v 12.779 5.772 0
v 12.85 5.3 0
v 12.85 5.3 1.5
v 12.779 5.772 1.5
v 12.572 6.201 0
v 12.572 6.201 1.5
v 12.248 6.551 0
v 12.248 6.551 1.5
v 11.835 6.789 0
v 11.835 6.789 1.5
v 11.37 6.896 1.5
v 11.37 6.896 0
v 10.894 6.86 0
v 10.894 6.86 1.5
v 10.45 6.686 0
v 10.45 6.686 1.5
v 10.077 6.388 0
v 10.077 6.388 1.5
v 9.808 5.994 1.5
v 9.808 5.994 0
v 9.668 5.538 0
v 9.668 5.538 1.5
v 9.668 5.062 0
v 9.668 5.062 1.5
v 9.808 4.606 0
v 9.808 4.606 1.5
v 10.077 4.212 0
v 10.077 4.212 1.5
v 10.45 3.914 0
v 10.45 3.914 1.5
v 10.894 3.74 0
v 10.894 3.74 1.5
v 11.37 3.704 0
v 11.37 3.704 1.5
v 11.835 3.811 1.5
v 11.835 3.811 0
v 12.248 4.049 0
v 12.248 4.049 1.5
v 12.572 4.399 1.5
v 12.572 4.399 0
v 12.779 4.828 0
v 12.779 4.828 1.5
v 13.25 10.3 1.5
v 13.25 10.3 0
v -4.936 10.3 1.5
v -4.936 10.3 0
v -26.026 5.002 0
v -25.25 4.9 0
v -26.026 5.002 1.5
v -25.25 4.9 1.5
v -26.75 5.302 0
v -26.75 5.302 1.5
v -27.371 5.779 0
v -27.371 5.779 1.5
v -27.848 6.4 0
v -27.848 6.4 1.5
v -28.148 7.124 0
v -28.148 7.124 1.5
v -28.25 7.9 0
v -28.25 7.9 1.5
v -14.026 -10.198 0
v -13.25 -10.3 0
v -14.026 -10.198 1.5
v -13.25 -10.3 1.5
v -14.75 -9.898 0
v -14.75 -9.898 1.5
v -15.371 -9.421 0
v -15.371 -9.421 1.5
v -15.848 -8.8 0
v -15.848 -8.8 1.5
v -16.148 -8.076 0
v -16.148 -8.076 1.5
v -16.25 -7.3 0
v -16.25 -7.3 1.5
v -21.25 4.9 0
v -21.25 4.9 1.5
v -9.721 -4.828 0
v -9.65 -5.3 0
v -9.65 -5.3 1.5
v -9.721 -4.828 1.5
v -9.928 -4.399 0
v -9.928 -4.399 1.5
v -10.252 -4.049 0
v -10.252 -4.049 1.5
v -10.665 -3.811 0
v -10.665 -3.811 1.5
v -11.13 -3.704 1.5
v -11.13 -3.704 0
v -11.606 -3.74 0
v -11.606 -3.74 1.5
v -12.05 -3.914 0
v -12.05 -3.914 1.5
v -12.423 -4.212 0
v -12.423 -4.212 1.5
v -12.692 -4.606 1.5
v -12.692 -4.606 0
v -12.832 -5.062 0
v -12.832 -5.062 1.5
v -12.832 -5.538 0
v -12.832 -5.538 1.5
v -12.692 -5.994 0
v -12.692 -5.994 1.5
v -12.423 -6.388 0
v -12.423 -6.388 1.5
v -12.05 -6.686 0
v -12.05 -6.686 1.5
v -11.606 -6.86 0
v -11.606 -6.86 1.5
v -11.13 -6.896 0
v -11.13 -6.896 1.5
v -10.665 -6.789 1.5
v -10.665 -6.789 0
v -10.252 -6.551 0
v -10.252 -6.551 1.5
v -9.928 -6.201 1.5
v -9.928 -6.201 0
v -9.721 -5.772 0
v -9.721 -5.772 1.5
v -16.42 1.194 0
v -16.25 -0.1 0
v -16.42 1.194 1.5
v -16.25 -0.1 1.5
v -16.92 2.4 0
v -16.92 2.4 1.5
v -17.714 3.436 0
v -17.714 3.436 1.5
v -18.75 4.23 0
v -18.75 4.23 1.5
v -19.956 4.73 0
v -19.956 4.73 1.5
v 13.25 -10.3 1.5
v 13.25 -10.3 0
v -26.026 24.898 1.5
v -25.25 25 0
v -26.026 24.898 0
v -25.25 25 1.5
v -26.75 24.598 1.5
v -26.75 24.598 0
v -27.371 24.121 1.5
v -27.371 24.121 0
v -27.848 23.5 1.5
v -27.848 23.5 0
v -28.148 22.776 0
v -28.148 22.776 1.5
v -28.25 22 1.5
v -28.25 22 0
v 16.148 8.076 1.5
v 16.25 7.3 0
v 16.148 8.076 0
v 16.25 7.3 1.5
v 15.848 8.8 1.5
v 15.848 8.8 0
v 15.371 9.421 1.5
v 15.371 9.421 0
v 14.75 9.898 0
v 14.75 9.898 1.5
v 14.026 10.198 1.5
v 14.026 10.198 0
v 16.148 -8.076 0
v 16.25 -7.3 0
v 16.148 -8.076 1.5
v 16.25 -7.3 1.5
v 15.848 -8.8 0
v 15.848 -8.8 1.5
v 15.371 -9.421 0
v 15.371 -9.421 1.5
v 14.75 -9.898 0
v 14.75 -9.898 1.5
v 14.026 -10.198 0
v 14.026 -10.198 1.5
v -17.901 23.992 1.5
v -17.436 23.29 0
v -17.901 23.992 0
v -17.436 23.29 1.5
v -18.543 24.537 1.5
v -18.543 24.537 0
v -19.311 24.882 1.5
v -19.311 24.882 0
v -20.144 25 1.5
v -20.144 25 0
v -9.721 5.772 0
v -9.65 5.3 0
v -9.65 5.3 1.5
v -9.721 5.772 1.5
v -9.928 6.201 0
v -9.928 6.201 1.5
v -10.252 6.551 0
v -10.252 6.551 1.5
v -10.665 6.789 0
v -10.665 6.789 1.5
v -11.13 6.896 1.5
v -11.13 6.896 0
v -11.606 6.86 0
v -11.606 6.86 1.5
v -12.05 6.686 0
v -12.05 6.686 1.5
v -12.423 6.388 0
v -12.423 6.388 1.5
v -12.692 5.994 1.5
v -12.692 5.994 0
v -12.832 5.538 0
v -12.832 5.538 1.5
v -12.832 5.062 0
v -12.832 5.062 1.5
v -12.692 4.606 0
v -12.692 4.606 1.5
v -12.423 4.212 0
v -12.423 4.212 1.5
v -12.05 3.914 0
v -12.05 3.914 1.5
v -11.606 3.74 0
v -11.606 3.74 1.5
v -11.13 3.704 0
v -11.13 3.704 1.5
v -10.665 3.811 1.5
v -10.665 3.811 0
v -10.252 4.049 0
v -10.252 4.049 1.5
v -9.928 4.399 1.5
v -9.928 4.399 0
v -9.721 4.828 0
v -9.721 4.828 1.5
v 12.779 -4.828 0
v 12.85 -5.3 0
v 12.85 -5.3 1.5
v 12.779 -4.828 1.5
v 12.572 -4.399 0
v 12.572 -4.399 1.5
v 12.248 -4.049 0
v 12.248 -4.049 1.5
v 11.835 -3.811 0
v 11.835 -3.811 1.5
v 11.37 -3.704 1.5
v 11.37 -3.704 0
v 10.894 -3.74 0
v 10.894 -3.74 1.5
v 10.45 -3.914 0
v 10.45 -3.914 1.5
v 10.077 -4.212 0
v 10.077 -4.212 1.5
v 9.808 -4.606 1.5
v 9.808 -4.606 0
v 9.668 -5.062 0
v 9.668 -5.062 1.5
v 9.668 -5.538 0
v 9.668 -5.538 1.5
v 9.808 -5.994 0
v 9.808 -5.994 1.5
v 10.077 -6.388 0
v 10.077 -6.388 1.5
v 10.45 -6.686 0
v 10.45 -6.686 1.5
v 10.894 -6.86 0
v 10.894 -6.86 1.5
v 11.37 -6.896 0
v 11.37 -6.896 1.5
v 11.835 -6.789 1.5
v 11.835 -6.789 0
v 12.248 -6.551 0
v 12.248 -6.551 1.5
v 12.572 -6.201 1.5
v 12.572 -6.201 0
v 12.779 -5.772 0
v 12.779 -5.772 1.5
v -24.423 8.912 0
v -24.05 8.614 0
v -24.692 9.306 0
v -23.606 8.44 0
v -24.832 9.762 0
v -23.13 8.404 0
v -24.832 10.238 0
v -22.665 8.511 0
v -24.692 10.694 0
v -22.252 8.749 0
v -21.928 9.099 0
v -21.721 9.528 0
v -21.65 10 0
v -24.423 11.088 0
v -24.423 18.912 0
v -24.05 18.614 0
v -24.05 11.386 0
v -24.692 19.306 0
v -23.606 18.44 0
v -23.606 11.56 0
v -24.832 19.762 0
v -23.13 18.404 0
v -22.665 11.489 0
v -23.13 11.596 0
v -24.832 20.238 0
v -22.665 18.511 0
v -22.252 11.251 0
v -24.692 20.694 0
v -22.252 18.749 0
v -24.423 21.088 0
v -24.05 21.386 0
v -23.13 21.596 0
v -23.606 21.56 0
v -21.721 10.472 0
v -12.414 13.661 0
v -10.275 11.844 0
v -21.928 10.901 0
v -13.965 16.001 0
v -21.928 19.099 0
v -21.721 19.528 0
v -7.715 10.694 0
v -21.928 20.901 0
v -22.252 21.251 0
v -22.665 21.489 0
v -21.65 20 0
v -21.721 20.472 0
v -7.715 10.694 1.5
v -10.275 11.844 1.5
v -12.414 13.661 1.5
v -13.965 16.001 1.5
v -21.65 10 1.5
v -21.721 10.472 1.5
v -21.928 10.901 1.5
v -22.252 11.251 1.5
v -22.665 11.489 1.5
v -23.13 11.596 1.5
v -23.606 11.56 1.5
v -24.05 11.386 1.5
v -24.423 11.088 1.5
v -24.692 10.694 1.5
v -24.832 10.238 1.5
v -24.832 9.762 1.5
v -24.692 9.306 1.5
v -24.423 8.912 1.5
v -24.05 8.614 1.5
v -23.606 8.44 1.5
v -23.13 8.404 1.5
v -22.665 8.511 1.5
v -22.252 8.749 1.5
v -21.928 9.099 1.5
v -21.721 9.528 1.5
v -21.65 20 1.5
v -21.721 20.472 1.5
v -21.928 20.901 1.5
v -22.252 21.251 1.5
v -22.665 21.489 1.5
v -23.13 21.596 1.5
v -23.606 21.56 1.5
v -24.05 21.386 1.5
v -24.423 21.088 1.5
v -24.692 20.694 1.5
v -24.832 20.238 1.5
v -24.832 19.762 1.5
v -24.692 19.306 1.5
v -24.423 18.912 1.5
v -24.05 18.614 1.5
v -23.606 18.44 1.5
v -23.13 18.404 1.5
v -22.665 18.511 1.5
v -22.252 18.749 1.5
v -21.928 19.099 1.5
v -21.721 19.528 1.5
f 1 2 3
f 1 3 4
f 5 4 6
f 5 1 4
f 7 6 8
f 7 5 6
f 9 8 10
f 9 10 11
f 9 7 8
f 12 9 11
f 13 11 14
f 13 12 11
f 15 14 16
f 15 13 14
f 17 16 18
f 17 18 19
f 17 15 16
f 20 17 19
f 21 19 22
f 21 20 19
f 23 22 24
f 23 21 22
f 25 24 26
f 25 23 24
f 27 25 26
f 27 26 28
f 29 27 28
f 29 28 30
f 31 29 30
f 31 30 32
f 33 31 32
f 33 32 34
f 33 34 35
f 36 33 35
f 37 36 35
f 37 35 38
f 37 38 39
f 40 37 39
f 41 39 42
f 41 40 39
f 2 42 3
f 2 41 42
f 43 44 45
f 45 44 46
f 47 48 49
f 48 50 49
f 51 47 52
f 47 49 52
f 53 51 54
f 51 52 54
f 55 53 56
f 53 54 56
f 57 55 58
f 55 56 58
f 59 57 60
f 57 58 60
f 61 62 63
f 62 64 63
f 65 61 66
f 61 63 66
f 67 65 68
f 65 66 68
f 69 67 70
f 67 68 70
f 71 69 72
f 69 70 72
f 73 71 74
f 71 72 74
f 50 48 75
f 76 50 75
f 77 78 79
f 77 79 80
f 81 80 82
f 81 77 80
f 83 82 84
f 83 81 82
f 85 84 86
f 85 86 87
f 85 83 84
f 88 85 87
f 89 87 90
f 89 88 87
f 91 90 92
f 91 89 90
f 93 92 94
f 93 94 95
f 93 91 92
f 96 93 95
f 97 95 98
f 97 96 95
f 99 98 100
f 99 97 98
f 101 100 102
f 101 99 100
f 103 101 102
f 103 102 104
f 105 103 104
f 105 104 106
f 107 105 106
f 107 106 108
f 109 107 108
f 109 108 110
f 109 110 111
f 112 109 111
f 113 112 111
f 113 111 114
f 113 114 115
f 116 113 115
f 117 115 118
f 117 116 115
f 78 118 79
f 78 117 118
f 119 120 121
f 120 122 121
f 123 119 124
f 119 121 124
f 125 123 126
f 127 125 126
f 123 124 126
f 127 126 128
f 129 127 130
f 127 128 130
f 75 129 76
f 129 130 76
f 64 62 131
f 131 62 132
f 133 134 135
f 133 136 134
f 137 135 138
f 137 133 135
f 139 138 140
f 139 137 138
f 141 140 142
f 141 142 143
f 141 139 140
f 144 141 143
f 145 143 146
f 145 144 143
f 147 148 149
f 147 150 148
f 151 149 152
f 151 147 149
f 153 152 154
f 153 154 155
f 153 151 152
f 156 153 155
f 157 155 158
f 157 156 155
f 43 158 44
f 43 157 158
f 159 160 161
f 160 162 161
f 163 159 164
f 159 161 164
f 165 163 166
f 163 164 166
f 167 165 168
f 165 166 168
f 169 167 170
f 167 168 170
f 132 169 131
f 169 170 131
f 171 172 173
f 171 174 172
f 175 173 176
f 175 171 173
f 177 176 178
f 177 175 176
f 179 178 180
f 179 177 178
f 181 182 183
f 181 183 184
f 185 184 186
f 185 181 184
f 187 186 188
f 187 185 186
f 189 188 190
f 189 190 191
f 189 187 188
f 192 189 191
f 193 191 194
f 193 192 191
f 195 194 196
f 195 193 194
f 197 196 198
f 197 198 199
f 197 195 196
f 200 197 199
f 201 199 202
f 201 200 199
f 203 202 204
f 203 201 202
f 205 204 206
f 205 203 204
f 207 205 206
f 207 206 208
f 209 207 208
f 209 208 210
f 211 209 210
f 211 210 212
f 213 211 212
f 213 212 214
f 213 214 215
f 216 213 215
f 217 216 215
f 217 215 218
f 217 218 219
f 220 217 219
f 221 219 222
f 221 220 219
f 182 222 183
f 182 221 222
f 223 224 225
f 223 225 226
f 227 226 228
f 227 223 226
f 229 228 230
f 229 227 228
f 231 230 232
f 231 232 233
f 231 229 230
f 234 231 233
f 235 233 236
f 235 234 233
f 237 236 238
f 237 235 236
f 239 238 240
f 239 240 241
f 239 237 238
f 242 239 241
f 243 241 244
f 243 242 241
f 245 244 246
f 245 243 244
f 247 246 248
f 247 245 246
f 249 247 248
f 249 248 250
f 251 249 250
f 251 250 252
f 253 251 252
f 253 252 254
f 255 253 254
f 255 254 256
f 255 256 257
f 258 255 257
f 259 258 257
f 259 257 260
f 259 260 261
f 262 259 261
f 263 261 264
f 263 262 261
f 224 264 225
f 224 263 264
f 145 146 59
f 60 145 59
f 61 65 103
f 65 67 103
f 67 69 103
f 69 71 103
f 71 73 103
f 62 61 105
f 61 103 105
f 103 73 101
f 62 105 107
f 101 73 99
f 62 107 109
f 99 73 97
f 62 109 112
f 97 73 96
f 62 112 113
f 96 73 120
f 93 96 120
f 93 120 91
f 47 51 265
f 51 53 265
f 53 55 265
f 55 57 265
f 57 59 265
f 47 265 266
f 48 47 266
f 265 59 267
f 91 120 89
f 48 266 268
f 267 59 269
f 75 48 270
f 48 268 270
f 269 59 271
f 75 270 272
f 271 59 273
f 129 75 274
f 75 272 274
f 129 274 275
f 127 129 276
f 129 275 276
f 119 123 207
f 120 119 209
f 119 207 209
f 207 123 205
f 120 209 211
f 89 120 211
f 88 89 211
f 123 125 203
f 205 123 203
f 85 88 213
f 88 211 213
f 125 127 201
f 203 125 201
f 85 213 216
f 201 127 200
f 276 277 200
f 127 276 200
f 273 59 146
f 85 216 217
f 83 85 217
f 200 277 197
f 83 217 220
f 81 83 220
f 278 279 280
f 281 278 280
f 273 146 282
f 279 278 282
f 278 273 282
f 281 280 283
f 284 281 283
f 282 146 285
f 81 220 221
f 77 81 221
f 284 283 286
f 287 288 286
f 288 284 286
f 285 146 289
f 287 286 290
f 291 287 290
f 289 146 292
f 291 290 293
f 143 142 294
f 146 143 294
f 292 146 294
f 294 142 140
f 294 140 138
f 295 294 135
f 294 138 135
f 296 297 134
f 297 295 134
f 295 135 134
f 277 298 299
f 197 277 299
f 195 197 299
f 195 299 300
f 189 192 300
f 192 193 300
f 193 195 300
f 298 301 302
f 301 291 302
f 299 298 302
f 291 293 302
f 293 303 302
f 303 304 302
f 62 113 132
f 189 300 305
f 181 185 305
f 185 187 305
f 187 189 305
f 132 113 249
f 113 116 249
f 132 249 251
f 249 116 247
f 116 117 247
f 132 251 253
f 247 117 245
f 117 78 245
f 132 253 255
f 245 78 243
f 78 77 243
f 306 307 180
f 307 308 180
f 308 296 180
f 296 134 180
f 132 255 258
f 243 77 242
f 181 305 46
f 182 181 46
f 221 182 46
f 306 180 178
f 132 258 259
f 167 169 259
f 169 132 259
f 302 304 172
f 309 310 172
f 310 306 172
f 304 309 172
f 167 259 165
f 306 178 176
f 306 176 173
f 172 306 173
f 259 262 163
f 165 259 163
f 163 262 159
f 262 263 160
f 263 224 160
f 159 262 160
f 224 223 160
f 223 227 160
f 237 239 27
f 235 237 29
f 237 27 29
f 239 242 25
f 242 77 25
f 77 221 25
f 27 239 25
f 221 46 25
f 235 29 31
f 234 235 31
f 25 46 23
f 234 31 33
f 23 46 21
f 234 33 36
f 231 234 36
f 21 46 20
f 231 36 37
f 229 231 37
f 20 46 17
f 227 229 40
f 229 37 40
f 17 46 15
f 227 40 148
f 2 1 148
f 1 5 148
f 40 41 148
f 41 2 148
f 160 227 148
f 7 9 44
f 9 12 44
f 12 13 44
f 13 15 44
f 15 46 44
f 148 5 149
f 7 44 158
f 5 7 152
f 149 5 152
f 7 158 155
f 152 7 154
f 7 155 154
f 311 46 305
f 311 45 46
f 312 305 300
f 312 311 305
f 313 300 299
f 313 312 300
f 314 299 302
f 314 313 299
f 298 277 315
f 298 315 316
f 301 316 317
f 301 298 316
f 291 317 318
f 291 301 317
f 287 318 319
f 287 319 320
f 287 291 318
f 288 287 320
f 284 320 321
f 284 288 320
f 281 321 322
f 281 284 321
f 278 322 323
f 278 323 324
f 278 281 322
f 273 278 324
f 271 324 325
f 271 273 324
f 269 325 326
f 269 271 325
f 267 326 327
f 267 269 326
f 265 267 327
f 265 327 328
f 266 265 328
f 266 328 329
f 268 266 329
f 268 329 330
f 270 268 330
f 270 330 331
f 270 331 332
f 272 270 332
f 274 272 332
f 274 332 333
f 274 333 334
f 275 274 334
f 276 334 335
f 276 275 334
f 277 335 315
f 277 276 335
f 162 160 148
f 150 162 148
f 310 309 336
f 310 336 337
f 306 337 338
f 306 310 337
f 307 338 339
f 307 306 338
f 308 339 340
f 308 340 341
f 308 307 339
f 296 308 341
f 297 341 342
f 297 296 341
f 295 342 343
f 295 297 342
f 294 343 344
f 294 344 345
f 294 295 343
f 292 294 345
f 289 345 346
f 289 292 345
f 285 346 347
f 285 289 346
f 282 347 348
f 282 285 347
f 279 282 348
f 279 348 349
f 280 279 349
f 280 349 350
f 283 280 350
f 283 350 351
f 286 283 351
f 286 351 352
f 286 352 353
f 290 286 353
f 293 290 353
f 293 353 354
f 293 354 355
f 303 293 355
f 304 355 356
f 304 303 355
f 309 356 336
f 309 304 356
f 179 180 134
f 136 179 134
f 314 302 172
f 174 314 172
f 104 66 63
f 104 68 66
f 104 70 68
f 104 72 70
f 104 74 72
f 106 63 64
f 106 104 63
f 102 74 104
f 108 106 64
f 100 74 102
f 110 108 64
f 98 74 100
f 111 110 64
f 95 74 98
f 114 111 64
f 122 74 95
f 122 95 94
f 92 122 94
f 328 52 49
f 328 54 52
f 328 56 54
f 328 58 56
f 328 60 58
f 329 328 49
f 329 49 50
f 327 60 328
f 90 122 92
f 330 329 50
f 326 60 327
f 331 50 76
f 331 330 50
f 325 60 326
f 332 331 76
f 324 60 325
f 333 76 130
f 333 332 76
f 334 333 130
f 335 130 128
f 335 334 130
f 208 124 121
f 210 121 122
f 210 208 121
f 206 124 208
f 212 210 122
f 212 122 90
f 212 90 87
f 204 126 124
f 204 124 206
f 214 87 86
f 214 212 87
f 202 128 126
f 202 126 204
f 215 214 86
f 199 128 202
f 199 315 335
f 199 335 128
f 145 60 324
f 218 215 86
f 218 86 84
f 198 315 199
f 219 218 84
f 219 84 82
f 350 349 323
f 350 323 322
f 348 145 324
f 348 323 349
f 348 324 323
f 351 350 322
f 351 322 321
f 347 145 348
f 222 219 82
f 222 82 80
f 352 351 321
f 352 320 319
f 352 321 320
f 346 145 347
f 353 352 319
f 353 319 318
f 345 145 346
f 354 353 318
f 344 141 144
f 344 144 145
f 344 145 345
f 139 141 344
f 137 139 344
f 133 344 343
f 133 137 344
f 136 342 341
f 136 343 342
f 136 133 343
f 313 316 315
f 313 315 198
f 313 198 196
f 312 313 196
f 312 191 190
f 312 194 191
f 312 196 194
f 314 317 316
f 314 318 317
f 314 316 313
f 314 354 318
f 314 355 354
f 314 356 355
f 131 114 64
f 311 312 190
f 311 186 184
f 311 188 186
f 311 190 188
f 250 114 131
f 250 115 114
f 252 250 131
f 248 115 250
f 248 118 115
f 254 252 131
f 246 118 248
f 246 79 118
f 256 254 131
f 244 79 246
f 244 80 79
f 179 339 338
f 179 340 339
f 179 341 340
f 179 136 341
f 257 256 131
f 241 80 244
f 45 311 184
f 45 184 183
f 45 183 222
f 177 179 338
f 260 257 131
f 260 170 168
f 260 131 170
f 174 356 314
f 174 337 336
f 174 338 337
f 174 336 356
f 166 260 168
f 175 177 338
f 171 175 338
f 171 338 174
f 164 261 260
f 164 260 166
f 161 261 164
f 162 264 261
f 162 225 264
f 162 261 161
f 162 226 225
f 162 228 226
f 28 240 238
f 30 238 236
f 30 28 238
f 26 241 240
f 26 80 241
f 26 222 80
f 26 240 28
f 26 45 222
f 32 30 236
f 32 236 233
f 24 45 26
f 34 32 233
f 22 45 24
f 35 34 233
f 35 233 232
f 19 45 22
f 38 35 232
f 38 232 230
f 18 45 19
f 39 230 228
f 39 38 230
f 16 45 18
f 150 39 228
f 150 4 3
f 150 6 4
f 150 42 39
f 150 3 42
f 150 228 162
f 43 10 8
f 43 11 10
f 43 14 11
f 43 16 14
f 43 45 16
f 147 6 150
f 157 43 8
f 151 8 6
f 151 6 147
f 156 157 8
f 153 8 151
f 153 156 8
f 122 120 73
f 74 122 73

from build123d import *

# Parameters (mm, degrees)
SKETCH_1_R      = 1.6
EXTRUDE_1_DEPTH = 1.5
FILLET_5_R      = 3
FILLET_6_R      = 5
FILLET_8_R      = 10


with BuildPart() as part:
    # ｽｹｯﾁ1 → ﾎﾞｽ - 押し出し1 (new body)
    with BuildSketch(Plane.XY):
        Polygon((16.25, -10.3), (16.25, 10.3), (-11.25, 10.3), (-18.25, 25), (-28.25, 25), (-28.25, 4.9), (-16.25, 4.9), (-16.25, -10.3), align=None)
        with Locations((-11.25, -5.3)):
            Circle(SKETCH_1_R, mode=Mode.SUBTRACT)
        with Locations((11.25, -5.3)):
            Circle(SKETCH_1_R, mode=Mode.SUBTRACT)
        with Locations((-11.25, 5.3)):
            Circle(SKETCH_1_R, mode=Mode.SUBTRACT)
        with Locations((11.25, 5.3)):
            Circle(SKETCH_1_R, mode=Mode.SUBTRACT)
        with Locations((-23.25, 20)):
            Circle(SKETCH_1_R, mode=Mode.SUBTRACT)
        with Locations((-23.25, 10)):
            Circle(SKETCH_1_R, mode=Mode.SUBTRACT)
    extrude(amount=EXTRUDE_1_DEPTH)

    # ﾌｨﾚｯﾄ5
    fillet_5_edges = [part.edges().sort_by_distance(p)[0] for p in [
        (-28.25, 4.9, 0.75),
        (-28.25, 25, 0.75),
        (-18.25, 25, 0.75),
        (16.25, 10.3, 0.75),
        (16.25, -10.3, 0.75),
        (-16.25, -10.3, 0.75),
    ]]
    fillet(fillet_5_edges, radius=FILLET_5_R)

    # ﾌｨﾚｯﾄ6
    fillet_6_edges = [part.edges().sort_by_distance(p)[0] for p in [
        (-16.25, 4.9, 0.75),
    ]]
    fillet(fillet_6_edges, radius=FILLET_6_R)

    # ﾌｨﾚｯﾄ8
    fillet_8_edges = [part.edges().sort_by_distance(p)[0] for p in [
        (-11.25, 10.3, 0.75),
    ]]
    fillet(fillet_8_edges, radius=FILLET_8_R)


solid = part.part
